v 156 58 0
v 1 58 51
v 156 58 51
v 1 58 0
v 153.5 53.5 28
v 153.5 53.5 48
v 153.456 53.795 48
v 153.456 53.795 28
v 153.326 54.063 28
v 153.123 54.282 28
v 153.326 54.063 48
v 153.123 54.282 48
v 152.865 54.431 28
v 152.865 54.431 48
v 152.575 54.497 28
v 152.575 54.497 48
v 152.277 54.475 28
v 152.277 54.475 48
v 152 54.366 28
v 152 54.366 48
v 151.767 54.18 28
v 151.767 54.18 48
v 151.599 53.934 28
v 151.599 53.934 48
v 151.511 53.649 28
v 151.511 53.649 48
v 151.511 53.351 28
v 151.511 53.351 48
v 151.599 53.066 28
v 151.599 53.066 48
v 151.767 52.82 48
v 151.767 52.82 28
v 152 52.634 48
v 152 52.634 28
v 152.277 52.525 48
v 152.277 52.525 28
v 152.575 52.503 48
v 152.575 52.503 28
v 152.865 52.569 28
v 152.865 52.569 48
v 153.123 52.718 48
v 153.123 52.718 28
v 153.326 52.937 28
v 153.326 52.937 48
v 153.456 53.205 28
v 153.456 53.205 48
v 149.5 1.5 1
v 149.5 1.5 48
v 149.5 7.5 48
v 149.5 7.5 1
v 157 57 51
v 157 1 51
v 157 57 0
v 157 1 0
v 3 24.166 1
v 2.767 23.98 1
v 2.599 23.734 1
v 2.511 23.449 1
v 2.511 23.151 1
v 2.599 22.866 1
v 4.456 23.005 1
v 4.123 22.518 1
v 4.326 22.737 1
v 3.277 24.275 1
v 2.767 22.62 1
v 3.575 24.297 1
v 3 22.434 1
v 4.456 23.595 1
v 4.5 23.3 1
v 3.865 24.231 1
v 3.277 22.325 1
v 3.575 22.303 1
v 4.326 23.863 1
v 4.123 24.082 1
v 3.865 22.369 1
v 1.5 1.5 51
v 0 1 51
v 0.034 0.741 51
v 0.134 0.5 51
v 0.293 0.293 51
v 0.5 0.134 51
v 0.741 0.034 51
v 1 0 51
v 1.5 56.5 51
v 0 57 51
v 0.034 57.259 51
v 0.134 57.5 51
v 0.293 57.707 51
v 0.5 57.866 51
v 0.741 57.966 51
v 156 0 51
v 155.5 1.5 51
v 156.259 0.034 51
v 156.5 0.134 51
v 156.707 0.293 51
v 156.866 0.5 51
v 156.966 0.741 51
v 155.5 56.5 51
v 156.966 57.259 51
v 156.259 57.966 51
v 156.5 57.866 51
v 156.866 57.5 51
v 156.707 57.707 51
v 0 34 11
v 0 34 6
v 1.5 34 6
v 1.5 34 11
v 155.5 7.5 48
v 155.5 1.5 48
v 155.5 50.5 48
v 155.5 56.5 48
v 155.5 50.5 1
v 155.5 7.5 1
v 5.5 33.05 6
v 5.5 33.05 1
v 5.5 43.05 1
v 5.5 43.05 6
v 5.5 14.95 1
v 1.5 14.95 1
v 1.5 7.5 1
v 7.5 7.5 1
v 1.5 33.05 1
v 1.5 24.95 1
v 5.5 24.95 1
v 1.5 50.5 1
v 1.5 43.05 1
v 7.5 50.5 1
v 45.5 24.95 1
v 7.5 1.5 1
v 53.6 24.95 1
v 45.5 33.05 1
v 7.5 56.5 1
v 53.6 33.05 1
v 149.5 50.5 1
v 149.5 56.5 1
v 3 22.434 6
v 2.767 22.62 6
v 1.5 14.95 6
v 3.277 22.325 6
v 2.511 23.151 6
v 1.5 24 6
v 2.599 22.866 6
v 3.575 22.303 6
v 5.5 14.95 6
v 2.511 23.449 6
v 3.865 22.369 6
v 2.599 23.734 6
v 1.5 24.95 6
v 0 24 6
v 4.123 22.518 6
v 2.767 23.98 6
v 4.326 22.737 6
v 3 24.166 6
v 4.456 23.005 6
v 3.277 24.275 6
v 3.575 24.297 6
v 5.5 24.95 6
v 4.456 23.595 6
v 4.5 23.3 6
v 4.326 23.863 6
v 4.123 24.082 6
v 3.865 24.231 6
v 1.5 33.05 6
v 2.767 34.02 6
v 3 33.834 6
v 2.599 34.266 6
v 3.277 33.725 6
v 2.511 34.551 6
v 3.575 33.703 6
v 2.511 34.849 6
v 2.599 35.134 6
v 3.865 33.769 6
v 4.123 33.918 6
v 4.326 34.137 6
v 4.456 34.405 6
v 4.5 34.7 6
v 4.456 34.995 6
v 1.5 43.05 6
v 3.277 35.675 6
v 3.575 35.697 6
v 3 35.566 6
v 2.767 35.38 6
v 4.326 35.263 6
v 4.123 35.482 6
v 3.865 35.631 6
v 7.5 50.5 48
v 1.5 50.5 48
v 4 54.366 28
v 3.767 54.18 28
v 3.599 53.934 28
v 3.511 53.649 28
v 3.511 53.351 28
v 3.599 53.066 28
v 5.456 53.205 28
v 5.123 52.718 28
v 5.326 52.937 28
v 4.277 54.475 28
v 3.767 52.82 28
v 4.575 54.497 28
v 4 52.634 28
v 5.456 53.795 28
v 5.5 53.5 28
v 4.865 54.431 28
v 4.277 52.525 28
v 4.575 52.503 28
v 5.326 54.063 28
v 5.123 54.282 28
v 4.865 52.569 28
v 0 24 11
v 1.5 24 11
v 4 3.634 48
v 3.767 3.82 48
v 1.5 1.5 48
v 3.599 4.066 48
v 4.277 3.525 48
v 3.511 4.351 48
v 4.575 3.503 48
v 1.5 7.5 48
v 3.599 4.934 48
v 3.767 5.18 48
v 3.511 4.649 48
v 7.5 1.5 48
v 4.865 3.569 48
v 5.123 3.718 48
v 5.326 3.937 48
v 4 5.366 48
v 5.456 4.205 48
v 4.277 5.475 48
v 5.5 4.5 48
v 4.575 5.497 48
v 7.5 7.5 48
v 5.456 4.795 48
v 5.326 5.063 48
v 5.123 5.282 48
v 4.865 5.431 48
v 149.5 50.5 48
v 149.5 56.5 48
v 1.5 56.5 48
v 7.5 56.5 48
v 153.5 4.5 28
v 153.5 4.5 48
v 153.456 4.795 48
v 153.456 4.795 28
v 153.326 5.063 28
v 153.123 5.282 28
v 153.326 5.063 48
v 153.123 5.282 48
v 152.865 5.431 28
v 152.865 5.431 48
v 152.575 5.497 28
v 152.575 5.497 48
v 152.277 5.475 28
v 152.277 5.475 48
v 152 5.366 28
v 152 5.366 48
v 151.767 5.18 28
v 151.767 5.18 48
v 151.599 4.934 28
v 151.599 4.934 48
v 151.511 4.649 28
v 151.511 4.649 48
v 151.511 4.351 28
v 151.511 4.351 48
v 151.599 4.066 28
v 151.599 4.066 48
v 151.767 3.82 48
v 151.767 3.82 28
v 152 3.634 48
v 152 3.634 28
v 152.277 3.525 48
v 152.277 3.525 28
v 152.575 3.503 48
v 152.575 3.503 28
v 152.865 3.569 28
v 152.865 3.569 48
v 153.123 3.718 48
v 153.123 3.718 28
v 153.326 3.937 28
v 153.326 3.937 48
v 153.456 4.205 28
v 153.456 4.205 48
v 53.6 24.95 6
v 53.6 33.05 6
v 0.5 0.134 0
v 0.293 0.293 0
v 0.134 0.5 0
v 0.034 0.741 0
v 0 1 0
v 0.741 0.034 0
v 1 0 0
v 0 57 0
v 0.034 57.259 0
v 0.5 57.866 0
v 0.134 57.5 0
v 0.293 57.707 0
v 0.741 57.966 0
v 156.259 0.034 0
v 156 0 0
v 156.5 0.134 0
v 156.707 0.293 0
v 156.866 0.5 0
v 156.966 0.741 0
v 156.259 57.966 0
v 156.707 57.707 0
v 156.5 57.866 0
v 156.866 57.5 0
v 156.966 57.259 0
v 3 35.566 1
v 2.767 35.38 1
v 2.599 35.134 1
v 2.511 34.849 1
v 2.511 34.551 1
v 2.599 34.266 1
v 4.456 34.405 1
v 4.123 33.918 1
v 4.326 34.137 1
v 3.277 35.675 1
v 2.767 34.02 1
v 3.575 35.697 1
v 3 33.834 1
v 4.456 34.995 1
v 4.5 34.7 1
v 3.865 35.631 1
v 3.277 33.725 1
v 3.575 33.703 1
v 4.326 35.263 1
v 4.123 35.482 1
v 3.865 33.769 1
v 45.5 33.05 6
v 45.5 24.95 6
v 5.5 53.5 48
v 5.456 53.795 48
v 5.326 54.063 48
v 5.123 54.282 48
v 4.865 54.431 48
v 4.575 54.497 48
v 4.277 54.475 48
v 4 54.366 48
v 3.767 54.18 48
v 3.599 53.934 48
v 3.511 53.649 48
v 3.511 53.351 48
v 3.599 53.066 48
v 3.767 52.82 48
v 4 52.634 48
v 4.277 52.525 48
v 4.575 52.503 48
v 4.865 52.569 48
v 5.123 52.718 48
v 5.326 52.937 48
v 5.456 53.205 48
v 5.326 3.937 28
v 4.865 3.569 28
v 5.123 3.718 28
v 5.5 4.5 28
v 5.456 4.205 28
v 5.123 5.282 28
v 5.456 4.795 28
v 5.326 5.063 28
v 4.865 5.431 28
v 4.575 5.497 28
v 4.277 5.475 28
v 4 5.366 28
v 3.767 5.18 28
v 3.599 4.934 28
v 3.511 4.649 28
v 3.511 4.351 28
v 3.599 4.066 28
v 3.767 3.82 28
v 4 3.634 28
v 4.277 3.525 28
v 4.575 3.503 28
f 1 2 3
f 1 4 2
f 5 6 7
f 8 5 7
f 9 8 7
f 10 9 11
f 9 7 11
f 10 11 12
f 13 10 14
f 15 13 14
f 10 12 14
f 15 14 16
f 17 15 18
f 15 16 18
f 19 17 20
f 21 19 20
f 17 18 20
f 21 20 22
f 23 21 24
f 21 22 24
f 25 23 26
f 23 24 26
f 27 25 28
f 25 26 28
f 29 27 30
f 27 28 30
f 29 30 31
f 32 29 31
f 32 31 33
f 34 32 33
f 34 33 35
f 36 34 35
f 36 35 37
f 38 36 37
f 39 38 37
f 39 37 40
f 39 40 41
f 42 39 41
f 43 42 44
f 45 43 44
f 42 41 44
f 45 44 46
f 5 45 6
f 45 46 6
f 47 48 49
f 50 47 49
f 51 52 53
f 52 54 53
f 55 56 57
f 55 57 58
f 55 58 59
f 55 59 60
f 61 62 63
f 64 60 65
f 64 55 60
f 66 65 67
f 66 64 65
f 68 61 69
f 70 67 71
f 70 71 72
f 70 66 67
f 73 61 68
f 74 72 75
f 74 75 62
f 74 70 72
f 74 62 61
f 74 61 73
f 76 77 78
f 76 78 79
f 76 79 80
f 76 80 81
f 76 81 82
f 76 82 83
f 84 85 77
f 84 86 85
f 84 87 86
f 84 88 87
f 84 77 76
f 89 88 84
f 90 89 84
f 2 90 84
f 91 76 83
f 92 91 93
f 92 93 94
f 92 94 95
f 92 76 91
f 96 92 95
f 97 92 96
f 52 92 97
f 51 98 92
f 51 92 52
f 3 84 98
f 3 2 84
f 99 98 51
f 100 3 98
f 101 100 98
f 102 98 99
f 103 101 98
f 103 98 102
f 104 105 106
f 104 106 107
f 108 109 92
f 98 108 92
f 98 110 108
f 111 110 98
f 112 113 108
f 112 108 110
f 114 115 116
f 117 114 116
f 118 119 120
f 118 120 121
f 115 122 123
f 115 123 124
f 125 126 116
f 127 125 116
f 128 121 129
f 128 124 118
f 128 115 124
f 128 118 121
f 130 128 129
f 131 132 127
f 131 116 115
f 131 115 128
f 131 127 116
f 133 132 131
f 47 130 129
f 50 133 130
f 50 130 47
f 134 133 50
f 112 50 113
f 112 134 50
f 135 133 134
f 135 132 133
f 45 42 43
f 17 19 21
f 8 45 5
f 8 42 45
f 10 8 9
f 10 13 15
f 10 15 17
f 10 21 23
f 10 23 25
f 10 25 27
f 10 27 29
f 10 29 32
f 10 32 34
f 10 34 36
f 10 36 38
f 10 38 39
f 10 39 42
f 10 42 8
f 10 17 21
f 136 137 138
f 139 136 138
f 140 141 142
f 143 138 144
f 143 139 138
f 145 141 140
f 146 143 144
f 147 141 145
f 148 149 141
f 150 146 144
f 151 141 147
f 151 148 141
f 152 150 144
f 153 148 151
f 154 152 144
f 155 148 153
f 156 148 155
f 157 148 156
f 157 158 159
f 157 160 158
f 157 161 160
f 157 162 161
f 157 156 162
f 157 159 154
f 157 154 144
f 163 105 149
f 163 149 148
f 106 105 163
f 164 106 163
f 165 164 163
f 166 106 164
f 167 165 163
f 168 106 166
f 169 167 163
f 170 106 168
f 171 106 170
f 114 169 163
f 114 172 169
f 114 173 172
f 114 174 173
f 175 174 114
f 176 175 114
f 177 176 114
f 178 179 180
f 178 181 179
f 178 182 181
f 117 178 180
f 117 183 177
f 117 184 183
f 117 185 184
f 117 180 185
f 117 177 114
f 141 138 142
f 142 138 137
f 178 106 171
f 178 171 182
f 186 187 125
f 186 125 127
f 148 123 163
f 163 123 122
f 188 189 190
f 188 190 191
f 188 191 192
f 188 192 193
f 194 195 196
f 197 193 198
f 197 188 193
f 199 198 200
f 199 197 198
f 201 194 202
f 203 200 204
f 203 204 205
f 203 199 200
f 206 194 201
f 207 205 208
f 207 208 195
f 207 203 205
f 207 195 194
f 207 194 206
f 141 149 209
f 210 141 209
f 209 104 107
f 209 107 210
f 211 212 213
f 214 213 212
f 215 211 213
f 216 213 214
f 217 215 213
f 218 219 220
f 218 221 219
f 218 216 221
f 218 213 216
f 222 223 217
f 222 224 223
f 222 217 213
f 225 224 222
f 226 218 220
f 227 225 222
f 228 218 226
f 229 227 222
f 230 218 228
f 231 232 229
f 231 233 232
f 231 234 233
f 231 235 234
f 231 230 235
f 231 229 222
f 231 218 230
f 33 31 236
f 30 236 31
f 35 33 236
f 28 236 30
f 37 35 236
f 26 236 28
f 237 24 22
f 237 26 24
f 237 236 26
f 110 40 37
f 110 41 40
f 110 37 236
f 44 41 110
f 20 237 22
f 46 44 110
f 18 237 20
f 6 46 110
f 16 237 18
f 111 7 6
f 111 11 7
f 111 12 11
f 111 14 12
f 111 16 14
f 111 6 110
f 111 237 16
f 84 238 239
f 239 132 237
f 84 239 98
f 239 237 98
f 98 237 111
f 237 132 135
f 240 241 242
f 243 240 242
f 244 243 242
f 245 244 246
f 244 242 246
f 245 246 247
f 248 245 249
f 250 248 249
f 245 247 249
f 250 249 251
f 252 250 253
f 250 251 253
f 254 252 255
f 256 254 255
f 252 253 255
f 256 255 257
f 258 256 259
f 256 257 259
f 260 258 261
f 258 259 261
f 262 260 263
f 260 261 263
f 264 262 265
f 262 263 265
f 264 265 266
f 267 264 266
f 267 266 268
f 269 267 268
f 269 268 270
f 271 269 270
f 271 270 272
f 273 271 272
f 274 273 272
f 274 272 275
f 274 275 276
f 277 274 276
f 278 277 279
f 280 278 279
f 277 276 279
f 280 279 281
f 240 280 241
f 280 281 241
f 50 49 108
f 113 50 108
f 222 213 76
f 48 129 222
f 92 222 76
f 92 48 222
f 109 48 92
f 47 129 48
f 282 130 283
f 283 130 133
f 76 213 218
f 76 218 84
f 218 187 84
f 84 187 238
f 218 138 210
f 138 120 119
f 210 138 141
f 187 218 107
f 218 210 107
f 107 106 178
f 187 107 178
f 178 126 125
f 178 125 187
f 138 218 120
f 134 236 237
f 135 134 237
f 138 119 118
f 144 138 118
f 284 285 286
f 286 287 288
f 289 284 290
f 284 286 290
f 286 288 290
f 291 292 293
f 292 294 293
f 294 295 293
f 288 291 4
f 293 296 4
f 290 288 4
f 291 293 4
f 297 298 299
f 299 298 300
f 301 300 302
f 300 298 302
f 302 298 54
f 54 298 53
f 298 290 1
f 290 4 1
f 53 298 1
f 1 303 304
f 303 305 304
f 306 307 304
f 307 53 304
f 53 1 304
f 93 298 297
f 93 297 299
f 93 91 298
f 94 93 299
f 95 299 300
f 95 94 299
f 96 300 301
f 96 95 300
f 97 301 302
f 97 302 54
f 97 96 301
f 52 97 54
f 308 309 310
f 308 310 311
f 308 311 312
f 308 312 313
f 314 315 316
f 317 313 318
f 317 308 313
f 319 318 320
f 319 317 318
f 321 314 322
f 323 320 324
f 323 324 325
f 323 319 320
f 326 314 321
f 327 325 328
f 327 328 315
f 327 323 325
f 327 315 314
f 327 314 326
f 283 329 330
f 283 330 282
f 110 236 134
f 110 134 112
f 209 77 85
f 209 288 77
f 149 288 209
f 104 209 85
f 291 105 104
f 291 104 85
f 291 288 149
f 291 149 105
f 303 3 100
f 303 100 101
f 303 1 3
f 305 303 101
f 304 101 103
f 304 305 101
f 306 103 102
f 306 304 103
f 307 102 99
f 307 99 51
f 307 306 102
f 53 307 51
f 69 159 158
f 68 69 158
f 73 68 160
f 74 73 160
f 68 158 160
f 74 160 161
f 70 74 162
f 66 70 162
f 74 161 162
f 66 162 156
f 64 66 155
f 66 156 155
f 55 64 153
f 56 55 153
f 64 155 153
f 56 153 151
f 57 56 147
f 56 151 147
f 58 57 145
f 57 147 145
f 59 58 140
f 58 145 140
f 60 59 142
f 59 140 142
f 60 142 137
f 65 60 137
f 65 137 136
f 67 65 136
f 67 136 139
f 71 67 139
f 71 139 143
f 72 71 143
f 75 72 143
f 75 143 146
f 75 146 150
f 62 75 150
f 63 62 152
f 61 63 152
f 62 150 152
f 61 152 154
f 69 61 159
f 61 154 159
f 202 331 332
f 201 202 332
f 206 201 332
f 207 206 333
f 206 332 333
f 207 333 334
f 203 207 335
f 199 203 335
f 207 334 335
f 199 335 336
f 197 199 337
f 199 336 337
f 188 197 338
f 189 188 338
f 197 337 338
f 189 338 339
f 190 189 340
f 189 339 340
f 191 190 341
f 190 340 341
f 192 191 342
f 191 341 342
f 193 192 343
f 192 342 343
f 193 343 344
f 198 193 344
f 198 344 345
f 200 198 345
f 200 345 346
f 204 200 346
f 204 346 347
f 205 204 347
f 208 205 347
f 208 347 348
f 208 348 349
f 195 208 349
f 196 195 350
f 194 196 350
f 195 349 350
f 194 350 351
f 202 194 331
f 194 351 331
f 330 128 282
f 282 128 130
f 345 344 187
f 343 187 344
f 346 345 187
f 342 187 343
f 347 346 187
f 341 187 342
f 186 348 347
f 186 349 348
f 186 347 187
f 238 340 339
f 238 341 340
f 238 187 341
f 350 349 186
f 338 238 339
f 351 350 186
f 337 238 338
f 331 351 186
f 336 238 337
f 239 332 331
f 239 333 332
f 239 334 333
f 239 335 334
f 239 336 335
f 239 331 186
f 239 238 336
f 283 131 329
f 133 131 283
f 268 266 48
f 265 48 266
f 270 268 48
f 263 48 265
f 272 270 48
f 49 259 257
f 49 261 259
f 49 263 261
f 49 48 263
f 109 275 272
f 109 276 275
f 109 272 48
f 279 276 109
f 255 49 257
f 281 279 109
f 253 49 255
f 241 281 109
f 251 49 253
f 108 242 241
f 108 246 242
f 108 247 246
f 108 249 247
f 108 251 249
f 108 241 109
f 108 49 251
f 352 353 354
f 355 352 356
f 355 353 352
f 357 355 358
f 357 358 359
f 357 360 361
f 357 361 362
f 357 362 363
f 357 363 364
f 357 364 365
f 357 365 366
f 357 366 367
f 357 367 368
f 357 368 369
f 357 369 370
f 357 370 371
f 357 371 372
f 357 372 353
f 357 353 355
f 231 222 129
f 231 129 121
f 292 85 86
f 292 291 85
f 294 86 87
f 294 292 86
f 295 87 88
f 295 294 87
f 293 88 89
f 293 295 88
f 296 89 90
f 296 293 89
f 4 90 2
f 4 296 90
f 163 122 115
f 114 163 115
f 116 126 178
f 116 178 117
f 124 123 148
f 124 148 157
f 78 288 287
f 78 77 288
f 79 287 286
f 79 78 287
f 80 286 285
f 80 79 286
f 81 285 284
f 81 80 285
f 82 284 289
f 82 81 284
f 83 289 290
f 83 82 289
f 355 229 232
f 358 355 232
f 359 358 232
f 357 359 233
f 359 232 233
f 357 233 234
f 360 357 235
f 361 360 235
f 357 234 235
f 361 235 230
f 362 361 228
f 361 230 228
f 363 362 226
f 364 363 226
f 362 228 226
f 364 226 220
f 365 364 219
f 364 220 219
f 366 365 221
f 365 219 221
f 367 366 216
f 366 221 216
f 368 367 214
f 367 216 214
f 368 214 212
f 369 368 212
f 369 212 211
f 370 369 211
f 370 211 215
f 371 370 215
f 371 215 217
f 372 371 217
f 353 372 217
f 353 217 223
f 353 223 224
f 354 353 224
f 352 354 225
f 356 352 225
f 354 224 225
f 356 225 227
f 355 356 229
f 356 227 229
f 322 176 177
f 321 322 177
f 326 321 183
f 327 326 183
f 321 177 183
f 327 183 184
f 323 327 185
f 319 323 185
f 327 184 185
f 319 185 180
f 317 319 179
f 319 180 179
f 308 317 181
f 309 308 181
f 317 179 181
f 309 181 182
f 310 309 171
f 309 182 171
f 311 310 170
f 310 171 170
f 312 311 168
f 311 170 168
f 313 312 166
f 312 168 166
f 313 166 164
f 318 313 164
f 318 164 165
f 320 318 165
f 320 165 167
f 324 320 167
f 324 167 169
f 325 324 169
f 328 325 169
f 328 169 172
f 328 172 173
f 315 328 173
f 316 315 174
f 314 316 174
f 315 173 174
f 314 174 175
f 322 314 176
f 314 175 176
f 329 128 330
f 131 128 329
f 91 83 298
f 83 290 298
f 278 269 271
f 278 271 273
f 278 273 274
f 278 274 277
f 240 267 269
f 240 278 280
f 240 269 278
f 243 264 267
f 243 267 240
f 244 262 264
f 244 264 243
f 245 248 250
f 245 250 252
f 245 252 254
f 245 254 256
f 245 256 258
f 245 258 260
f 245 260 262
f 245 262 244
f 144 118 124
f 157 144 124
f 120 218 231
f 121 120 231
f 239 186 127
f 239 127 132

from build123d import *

# Parameters (mm, degrees)
SKETCH_W        = 157
SKETCH_H        = 58
PAD_DEPTH       = 1
SKETCH001_W     = 157
SKETCH001_H     = 58
SKETCH001_W_2   = 154
SKETCH001_H_2   = 55
PAD001_DEPTH    = 50
SKETCH002_W     = 6
SKETCH002_H     = 6
PAD002_DEPTH    = 47
SKETCH003_R     = 1
POCKET_DEPTH    = 20
SKETCH004_W     = 4
SKETCH004_H     = 10
SKETCH004_W_2   = 8.1
SKETCH004_H_2   = 8.1
PAD003_DEPTH    = 5
SKETCH005_R     = 1
POCKET001_DEPTH = 5
SKETCH006_W     = 10
SKETCH006_H     = 5
POCKET002_DEPTH = 1.5
FILLET_R        = 1


with BuildPart() as part:
    # Sketch → Pad (new body)
    with BuildSketch(Plane.XY):
        with Locations((78.5, 29)):
            Rectangle(SKETCH_W, SKETCH_H)
    extrude(amount=PAD_DEPTH)

    # Sketch001 (on Face6 of Pad) → Pad001 (join)
    with BuildSketch(Plane.XY.offset(1)):
        with Locations((78.5, 29)):
            Rectangle(SKETCH001_W, SKETCH001_H)
        with Locations((78.5, 29)):
            Rectangle(SKETCH001_W_2, SKETCH001_H_2, mode=Mode.SUBTRACT)
    extrude(amount=PAD001_DEPTH)

    # Sketch002 (on Face15 of Pad001) → Pad002 (join)
    with BuildSketch(Plane.XY.offset(1)):
        with Locations((4.5, 53.5)):
            Rectangle(SKETCH002_W, SKETCH002_H)
        with Locations((152.5, 53.5)):
            Rectangle(SKETCH002_W, SKETCH002_H)
        with Locations((152.5, 4.5)):
            Rectangle(SKETCH002_W, SKETCH002_H)
        with Locations((4.5, 4.5)):
            Rectangle(SKETCH002_W, SKETCH002_H)
    extrude(amount=PAD002_DEPTH)

    # Sketch003 (on Face15 of Pad002) → Pocket (cut)
    with BuildSketch(Plane.XY.offset(48)):
        with Locations((4.5, 53.5)):
            Circle(SKETCH003_R)
        with Locations((4.5, 4.5)):
            Circle(SKETCH003_R)
        with Locations((152.5, 4.5)):
            Circle(SKETCH003_R)
        with Locations((152.5, 53.5)):
            Circle(SKETCH003_R)
    extrude(amount=-POCKET_DEPTH, mode=Mode.SUBTRACT)

    # Sketch004 (on Face17 of Pocket) → Pad003 (join)
    with BuildSketch(Plane.XY.offset(1)):
        with Locations((3.5, 38.05)):
            Rectangle(SKETCH004_W, SKETCH004_H)
        with Locations((3.5, 19.95)):
            Rectangle(SKETCH004_W, SKETCH004_H)
        with Locations((49.55, 29)):
            Rectangle(SKETCH004_W_2, SKETCH004_H_2)
    extrude(amount=PAD003_DEPTH)

    # Sketch005 (on Face28 of Pad003) → Pocket001 (cut)
    with BuildSketch(Plane.XY.offset(6)):
        with Locations((3.5, 34.7)):
            Circle(SKETCH005_R)
        with Locations((3.5, 23.3)):
            Circle(SKETCH005_R)
    extrude(amount=-POCKET001_DEPTH, mode=Mode.SUBTRACT)

    # Sketch006 (on Face7 of Pocket001) → Pocket002 (cut)
    with BuildSketch(Plane(origin=(0, 0, 0), x_dir=(0, -1, 0), z_dir=(-1, 0, 0))):
        with Locations((-29, 8.5)):
            Rectangle(SKETCH006_W, SKETCH006_H)
    extrude(amount=-POCKET002_DEPTH, mode=Mode.SUBTRACT)

    # Fillet
    fillet_edges = [part.edges().sort_by_distance(p)[0] for p in [
        (157, 0, 26),
        (157, 58, 26),
        (0, 58, 26),
        (0, 0, 26),
    ]]
    fillet(fillet_edges, radius=FILLET_R)


solid = part.part
